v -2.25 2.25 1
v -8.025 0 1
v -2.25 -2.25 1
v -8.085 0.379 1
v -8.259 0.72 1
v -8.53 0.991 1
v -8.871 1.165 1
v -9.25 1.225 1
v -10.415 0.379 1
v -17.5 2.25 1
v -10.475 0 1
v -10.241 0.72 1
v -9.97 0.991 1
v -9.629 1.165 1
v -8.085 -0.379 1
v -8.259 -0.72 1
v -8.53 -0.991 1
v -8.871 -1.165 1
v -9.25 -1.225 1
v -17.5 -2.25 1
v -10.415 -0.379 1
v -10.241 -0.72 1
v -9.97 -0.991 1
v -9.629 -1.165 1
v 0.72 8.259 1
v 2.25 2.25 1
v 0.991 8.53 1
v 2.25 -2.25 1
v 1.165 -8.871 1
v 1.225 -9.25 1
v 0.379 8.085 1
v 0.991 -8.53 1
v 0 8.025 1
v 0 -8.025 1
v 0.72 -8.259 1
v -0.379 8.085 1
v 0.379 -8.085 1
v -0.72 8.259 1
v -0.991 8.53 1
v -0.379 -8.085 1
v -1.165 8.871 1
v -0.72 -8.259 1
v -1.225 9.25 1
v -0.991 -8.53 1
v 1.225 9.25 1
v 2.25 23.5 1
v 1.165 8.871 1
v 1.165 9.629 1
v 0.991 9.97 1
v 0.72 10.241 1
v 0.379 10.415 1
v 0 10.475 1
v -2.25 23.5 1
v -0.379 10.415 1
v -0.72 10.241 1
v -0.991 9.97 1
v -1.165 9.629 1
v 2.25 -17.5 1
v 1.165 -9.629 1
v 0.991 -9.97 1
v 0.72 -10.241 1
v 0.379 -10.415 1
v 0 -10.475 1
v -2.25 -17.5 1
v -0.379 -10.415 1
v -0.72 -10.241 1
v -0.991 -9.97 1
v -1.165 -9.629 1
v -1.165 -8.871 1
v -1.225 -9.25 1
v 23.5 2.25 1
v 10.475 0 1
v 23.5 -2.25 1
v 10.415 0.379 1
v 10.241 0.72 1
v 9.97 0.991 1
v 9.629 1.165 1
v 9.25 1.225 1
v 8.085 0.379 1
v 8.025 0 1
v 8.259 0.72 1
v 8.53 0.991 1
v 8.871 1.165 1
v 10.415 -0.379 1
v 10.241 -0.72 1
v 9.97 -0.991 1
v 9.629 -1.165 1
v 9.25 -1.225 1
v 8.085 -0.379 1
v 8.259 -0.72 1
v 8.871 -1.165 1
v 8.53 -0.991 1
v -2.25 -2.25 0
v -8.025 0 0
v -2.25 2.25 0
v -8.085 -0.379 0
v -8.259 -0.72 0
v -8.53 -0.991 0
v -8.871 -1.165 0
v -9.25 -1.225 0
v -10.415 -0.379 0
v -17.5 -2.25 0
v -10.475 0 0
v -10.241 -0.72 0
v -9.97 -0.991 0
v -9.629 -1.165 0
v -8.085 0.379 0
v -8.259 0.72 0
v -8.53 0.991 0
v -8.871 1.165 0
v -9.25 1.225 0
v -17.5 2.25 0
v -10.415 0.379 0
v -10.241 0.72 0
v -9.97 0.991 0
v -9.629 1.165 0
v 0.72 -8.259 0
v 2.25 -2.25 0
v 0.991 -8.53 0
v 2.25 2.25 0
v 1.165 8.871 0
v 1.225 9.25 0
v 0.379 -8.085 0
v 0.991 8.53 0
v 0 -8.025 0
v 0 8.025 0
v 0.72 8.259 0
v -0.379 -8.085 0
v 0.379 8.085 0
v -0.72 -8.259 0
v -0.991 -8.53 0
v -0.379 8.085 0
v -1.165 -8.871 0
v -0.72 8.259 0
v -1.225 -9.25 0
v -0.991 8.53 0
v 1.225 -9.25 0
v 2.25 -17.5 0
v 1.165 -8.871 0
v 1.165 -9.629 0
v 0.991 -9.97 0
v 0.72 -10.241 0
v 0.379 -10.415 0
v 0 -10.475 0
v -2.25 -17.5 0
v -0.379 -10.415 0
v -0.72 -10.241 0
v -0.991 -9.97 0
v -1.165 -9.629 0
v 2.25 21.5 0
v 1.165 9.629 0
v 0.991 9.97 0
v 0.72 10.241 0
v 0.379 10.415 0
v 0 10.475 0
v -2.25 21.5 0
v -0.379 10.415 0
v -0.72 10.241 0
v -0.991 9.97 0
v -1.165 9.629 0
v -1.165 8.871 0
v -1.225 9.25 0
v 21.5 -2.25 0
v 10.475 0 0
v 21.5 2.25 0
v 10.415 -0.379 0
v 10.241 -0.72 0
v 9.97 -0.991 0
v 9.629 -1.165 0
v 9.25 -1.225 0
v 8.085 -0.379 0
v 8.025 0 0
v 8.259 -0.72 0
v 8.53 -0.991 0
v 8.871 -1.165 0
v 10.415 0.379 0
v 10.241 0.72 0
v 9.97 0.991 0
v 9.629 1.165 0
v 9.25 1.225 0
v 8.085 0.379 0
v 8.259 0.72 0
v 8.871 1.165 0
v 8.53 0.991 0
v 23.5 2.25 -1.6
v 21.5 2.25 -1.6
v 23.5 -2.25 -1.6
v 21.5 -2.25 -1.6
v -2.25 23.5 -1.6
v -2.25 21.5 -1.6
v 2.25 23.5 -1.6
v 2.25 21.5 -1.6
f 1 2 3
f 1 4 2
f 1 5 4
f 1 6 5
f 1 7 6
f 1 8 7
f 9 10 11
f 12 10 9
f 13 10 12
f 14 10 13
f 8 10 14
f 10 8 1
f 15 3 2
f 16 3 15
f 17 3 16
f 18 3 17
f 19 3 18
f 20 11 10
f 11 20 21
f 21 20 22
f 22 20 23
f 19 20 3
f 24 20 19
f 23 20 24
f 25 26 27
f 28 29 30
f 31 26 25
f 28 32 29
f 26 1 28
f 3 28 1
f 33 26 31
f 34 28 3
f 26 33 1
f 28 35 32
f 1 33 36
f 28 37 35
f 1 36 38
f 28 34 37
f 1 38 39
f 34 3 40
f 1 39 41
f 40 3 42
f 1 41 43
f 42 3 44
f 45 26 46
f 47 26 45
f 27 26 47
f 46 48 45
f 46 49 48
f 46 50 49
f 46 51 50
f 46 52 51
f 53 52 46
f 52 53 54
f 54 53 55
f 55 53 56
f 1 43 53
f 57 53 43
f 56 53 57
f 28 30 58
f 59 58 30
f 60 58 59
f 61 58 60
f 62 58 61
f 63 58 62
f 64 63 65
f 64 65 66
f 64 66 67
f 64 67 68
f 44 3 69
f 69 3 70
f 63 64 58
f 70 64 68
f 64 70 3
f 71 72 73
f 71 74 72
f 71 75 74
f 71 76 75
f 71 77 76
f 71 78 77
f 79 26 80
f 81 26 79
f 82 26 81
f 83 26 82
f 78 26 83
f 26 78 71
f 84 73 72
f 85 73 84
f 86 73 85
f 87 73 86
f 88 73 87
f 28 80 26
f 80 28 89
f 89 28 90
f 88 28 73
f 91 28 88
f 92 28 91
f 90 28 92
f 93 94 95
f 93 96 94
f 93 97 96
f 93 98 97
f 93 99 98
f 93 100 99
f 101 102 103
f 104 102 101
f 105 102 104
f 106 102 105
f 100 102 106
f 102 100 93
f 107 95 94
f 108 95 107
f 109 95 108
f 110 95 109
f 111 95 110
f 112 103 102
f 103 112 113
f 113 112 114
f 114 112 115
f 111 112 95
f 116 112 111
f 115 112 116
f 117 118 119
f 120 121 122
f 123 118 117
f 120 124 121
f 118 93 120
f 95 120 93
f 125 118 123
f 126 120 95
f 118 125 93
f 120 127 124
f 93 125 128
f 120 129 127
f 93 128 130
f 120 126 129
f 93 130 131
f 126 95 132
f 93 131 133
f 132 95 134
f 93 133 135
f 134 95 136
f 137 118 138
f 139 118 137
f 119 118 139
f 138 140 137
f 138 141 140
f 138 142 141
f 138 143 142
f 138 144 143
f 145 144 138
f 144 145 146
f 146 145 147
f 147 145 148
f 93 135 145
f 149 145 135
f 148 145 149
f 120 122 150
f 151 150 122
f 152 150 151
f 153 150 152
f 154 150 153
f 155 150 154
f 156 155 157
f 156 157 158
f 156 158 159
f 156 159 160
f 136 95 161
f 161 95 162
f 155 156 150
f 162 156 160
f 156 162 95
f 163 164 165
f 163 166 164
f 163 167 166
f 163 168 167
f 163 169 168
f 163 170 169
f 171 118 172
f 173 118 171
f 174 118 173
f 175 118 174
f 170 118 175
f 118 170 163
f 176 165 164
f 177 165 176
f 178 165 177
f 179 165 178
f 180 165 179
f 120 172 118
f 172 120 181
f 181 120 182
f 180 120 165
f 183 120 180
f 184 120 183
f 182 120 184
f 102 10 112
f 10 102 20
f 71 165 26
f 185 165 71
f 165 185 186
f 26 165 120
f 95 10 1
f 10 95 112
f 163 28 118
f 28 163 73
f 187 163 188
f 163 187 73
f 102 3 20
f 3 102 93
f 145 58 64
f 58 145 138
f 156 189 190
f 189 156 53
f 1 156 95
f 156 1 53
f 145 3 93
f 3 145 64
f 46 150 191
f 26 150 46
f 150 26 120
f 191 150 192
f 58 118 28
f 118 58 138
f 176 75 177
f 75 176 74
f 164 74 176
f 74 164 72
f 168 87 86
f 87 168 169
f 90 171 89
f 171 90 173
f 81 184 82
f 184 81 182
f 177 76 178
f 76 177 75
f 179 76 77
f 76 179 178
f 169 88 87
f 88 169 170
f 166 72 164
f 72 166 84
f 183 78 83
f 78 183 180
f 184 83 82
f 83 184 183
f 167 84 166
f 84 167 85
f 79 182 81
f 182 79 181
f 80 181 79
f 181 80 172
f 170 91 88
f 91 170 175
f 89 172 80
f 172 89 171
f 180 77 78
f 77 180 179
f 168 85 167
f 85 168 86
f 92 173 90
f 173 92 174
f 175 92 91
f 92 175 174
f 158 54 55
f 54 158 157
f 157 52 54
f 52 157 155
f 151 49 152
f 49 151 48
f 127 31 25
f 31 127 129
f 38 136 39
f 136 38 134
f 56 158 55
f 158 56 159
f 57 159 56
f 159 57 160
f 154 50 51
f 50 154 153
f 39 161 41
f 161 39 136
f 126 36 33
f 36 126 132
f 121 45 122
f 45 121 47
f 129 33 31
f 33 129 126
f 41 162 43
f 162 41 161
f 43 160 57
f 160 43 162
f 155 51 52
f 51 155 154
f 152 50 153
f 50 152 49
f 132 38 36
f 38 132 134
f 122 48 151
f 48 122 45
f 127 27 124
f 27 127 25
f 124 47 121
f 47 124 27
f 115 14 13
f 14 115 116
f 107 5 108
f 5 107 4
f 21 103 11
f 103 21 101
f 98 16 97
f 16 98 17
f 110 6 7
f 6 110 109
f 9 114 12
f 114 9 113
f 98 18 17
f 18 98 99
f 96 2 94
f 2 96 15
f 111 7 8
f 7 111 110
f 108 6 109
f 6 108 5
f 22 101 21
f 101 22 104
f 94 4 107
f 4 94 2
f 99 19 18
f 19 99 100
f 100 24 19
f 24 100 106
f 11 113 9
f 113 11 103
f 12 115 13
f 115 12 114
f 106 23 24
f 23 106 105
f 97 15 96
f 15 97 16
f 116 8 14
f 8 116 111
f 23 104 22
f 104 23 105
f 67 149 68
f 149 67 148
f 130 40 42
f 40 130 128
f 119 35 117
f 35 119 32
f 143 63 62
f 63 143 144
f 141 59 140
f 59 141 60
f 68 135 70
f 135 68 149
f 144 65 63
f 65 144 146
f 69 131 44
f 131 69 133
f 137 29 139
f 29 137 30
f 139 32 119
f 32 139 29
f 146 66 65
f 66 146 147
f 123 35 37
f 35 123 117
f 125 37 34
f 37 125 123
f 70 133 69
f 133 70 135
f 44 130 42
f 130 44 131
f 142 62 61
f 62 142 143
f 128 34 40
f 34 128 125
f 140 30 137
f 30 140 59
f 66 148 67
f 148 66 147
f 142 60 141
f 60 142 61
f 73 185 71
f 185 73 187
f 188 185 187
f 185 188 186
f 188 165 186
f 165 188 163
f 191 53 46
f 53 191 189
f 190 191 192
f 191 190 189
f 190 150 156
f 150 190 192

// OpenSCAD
$fs = .4;

R = 35 / 2; // Holder radius (equal to touchpad radius).
BR = 2.45 / 2; // Button hole radius.
T = 1; // Thickness.
M = 3.7 + 9.1 / 2 - BR; // Margin between holder boundary and button hole.
// M = 3.7 + 9 / 2 - BR / 2; // Margin between holder boundary and button hole.
// M = 7.1; // Margin between holder boundary and button hole.
WSTICK = 4.5;

module button_hole() {
  translate([R - M - BR, 0, -.1])
    cylinder(h=T + .2, r=BR);
}

module button_fixture() {
  color("purple") union() {
      difference() {
        button_fixture_base();
        // cylinder(h=T, r=R);
        button_hole();
        rotate(90) button_hole();
        rotate(180) button_hole();
        rotate(270) button_hole();
      }
    }
  color("cyan") {
    button_fixture_hook();
    rotate(90)
      button_fixture_hook();
  }
}

module button_fixture_hook() {
  translate([R, -WSTICK / 2, 0])
    cube([6, WSTICK, 1]);
  translate([R + 4, -WSTICK / 2, -1.6])
    cube([2, WSTICK, 1.6]);
}

module button_fixture_base() {
  translate([-R, -WSTICK / 2, 0])
    cube([R * 2, WSTICK, 1]);
  rotate(90)
    translate([-R, -WSTICK / 2, 0])
      cube([R * 2, WSTICK, 1]);
}

button_fixture();
